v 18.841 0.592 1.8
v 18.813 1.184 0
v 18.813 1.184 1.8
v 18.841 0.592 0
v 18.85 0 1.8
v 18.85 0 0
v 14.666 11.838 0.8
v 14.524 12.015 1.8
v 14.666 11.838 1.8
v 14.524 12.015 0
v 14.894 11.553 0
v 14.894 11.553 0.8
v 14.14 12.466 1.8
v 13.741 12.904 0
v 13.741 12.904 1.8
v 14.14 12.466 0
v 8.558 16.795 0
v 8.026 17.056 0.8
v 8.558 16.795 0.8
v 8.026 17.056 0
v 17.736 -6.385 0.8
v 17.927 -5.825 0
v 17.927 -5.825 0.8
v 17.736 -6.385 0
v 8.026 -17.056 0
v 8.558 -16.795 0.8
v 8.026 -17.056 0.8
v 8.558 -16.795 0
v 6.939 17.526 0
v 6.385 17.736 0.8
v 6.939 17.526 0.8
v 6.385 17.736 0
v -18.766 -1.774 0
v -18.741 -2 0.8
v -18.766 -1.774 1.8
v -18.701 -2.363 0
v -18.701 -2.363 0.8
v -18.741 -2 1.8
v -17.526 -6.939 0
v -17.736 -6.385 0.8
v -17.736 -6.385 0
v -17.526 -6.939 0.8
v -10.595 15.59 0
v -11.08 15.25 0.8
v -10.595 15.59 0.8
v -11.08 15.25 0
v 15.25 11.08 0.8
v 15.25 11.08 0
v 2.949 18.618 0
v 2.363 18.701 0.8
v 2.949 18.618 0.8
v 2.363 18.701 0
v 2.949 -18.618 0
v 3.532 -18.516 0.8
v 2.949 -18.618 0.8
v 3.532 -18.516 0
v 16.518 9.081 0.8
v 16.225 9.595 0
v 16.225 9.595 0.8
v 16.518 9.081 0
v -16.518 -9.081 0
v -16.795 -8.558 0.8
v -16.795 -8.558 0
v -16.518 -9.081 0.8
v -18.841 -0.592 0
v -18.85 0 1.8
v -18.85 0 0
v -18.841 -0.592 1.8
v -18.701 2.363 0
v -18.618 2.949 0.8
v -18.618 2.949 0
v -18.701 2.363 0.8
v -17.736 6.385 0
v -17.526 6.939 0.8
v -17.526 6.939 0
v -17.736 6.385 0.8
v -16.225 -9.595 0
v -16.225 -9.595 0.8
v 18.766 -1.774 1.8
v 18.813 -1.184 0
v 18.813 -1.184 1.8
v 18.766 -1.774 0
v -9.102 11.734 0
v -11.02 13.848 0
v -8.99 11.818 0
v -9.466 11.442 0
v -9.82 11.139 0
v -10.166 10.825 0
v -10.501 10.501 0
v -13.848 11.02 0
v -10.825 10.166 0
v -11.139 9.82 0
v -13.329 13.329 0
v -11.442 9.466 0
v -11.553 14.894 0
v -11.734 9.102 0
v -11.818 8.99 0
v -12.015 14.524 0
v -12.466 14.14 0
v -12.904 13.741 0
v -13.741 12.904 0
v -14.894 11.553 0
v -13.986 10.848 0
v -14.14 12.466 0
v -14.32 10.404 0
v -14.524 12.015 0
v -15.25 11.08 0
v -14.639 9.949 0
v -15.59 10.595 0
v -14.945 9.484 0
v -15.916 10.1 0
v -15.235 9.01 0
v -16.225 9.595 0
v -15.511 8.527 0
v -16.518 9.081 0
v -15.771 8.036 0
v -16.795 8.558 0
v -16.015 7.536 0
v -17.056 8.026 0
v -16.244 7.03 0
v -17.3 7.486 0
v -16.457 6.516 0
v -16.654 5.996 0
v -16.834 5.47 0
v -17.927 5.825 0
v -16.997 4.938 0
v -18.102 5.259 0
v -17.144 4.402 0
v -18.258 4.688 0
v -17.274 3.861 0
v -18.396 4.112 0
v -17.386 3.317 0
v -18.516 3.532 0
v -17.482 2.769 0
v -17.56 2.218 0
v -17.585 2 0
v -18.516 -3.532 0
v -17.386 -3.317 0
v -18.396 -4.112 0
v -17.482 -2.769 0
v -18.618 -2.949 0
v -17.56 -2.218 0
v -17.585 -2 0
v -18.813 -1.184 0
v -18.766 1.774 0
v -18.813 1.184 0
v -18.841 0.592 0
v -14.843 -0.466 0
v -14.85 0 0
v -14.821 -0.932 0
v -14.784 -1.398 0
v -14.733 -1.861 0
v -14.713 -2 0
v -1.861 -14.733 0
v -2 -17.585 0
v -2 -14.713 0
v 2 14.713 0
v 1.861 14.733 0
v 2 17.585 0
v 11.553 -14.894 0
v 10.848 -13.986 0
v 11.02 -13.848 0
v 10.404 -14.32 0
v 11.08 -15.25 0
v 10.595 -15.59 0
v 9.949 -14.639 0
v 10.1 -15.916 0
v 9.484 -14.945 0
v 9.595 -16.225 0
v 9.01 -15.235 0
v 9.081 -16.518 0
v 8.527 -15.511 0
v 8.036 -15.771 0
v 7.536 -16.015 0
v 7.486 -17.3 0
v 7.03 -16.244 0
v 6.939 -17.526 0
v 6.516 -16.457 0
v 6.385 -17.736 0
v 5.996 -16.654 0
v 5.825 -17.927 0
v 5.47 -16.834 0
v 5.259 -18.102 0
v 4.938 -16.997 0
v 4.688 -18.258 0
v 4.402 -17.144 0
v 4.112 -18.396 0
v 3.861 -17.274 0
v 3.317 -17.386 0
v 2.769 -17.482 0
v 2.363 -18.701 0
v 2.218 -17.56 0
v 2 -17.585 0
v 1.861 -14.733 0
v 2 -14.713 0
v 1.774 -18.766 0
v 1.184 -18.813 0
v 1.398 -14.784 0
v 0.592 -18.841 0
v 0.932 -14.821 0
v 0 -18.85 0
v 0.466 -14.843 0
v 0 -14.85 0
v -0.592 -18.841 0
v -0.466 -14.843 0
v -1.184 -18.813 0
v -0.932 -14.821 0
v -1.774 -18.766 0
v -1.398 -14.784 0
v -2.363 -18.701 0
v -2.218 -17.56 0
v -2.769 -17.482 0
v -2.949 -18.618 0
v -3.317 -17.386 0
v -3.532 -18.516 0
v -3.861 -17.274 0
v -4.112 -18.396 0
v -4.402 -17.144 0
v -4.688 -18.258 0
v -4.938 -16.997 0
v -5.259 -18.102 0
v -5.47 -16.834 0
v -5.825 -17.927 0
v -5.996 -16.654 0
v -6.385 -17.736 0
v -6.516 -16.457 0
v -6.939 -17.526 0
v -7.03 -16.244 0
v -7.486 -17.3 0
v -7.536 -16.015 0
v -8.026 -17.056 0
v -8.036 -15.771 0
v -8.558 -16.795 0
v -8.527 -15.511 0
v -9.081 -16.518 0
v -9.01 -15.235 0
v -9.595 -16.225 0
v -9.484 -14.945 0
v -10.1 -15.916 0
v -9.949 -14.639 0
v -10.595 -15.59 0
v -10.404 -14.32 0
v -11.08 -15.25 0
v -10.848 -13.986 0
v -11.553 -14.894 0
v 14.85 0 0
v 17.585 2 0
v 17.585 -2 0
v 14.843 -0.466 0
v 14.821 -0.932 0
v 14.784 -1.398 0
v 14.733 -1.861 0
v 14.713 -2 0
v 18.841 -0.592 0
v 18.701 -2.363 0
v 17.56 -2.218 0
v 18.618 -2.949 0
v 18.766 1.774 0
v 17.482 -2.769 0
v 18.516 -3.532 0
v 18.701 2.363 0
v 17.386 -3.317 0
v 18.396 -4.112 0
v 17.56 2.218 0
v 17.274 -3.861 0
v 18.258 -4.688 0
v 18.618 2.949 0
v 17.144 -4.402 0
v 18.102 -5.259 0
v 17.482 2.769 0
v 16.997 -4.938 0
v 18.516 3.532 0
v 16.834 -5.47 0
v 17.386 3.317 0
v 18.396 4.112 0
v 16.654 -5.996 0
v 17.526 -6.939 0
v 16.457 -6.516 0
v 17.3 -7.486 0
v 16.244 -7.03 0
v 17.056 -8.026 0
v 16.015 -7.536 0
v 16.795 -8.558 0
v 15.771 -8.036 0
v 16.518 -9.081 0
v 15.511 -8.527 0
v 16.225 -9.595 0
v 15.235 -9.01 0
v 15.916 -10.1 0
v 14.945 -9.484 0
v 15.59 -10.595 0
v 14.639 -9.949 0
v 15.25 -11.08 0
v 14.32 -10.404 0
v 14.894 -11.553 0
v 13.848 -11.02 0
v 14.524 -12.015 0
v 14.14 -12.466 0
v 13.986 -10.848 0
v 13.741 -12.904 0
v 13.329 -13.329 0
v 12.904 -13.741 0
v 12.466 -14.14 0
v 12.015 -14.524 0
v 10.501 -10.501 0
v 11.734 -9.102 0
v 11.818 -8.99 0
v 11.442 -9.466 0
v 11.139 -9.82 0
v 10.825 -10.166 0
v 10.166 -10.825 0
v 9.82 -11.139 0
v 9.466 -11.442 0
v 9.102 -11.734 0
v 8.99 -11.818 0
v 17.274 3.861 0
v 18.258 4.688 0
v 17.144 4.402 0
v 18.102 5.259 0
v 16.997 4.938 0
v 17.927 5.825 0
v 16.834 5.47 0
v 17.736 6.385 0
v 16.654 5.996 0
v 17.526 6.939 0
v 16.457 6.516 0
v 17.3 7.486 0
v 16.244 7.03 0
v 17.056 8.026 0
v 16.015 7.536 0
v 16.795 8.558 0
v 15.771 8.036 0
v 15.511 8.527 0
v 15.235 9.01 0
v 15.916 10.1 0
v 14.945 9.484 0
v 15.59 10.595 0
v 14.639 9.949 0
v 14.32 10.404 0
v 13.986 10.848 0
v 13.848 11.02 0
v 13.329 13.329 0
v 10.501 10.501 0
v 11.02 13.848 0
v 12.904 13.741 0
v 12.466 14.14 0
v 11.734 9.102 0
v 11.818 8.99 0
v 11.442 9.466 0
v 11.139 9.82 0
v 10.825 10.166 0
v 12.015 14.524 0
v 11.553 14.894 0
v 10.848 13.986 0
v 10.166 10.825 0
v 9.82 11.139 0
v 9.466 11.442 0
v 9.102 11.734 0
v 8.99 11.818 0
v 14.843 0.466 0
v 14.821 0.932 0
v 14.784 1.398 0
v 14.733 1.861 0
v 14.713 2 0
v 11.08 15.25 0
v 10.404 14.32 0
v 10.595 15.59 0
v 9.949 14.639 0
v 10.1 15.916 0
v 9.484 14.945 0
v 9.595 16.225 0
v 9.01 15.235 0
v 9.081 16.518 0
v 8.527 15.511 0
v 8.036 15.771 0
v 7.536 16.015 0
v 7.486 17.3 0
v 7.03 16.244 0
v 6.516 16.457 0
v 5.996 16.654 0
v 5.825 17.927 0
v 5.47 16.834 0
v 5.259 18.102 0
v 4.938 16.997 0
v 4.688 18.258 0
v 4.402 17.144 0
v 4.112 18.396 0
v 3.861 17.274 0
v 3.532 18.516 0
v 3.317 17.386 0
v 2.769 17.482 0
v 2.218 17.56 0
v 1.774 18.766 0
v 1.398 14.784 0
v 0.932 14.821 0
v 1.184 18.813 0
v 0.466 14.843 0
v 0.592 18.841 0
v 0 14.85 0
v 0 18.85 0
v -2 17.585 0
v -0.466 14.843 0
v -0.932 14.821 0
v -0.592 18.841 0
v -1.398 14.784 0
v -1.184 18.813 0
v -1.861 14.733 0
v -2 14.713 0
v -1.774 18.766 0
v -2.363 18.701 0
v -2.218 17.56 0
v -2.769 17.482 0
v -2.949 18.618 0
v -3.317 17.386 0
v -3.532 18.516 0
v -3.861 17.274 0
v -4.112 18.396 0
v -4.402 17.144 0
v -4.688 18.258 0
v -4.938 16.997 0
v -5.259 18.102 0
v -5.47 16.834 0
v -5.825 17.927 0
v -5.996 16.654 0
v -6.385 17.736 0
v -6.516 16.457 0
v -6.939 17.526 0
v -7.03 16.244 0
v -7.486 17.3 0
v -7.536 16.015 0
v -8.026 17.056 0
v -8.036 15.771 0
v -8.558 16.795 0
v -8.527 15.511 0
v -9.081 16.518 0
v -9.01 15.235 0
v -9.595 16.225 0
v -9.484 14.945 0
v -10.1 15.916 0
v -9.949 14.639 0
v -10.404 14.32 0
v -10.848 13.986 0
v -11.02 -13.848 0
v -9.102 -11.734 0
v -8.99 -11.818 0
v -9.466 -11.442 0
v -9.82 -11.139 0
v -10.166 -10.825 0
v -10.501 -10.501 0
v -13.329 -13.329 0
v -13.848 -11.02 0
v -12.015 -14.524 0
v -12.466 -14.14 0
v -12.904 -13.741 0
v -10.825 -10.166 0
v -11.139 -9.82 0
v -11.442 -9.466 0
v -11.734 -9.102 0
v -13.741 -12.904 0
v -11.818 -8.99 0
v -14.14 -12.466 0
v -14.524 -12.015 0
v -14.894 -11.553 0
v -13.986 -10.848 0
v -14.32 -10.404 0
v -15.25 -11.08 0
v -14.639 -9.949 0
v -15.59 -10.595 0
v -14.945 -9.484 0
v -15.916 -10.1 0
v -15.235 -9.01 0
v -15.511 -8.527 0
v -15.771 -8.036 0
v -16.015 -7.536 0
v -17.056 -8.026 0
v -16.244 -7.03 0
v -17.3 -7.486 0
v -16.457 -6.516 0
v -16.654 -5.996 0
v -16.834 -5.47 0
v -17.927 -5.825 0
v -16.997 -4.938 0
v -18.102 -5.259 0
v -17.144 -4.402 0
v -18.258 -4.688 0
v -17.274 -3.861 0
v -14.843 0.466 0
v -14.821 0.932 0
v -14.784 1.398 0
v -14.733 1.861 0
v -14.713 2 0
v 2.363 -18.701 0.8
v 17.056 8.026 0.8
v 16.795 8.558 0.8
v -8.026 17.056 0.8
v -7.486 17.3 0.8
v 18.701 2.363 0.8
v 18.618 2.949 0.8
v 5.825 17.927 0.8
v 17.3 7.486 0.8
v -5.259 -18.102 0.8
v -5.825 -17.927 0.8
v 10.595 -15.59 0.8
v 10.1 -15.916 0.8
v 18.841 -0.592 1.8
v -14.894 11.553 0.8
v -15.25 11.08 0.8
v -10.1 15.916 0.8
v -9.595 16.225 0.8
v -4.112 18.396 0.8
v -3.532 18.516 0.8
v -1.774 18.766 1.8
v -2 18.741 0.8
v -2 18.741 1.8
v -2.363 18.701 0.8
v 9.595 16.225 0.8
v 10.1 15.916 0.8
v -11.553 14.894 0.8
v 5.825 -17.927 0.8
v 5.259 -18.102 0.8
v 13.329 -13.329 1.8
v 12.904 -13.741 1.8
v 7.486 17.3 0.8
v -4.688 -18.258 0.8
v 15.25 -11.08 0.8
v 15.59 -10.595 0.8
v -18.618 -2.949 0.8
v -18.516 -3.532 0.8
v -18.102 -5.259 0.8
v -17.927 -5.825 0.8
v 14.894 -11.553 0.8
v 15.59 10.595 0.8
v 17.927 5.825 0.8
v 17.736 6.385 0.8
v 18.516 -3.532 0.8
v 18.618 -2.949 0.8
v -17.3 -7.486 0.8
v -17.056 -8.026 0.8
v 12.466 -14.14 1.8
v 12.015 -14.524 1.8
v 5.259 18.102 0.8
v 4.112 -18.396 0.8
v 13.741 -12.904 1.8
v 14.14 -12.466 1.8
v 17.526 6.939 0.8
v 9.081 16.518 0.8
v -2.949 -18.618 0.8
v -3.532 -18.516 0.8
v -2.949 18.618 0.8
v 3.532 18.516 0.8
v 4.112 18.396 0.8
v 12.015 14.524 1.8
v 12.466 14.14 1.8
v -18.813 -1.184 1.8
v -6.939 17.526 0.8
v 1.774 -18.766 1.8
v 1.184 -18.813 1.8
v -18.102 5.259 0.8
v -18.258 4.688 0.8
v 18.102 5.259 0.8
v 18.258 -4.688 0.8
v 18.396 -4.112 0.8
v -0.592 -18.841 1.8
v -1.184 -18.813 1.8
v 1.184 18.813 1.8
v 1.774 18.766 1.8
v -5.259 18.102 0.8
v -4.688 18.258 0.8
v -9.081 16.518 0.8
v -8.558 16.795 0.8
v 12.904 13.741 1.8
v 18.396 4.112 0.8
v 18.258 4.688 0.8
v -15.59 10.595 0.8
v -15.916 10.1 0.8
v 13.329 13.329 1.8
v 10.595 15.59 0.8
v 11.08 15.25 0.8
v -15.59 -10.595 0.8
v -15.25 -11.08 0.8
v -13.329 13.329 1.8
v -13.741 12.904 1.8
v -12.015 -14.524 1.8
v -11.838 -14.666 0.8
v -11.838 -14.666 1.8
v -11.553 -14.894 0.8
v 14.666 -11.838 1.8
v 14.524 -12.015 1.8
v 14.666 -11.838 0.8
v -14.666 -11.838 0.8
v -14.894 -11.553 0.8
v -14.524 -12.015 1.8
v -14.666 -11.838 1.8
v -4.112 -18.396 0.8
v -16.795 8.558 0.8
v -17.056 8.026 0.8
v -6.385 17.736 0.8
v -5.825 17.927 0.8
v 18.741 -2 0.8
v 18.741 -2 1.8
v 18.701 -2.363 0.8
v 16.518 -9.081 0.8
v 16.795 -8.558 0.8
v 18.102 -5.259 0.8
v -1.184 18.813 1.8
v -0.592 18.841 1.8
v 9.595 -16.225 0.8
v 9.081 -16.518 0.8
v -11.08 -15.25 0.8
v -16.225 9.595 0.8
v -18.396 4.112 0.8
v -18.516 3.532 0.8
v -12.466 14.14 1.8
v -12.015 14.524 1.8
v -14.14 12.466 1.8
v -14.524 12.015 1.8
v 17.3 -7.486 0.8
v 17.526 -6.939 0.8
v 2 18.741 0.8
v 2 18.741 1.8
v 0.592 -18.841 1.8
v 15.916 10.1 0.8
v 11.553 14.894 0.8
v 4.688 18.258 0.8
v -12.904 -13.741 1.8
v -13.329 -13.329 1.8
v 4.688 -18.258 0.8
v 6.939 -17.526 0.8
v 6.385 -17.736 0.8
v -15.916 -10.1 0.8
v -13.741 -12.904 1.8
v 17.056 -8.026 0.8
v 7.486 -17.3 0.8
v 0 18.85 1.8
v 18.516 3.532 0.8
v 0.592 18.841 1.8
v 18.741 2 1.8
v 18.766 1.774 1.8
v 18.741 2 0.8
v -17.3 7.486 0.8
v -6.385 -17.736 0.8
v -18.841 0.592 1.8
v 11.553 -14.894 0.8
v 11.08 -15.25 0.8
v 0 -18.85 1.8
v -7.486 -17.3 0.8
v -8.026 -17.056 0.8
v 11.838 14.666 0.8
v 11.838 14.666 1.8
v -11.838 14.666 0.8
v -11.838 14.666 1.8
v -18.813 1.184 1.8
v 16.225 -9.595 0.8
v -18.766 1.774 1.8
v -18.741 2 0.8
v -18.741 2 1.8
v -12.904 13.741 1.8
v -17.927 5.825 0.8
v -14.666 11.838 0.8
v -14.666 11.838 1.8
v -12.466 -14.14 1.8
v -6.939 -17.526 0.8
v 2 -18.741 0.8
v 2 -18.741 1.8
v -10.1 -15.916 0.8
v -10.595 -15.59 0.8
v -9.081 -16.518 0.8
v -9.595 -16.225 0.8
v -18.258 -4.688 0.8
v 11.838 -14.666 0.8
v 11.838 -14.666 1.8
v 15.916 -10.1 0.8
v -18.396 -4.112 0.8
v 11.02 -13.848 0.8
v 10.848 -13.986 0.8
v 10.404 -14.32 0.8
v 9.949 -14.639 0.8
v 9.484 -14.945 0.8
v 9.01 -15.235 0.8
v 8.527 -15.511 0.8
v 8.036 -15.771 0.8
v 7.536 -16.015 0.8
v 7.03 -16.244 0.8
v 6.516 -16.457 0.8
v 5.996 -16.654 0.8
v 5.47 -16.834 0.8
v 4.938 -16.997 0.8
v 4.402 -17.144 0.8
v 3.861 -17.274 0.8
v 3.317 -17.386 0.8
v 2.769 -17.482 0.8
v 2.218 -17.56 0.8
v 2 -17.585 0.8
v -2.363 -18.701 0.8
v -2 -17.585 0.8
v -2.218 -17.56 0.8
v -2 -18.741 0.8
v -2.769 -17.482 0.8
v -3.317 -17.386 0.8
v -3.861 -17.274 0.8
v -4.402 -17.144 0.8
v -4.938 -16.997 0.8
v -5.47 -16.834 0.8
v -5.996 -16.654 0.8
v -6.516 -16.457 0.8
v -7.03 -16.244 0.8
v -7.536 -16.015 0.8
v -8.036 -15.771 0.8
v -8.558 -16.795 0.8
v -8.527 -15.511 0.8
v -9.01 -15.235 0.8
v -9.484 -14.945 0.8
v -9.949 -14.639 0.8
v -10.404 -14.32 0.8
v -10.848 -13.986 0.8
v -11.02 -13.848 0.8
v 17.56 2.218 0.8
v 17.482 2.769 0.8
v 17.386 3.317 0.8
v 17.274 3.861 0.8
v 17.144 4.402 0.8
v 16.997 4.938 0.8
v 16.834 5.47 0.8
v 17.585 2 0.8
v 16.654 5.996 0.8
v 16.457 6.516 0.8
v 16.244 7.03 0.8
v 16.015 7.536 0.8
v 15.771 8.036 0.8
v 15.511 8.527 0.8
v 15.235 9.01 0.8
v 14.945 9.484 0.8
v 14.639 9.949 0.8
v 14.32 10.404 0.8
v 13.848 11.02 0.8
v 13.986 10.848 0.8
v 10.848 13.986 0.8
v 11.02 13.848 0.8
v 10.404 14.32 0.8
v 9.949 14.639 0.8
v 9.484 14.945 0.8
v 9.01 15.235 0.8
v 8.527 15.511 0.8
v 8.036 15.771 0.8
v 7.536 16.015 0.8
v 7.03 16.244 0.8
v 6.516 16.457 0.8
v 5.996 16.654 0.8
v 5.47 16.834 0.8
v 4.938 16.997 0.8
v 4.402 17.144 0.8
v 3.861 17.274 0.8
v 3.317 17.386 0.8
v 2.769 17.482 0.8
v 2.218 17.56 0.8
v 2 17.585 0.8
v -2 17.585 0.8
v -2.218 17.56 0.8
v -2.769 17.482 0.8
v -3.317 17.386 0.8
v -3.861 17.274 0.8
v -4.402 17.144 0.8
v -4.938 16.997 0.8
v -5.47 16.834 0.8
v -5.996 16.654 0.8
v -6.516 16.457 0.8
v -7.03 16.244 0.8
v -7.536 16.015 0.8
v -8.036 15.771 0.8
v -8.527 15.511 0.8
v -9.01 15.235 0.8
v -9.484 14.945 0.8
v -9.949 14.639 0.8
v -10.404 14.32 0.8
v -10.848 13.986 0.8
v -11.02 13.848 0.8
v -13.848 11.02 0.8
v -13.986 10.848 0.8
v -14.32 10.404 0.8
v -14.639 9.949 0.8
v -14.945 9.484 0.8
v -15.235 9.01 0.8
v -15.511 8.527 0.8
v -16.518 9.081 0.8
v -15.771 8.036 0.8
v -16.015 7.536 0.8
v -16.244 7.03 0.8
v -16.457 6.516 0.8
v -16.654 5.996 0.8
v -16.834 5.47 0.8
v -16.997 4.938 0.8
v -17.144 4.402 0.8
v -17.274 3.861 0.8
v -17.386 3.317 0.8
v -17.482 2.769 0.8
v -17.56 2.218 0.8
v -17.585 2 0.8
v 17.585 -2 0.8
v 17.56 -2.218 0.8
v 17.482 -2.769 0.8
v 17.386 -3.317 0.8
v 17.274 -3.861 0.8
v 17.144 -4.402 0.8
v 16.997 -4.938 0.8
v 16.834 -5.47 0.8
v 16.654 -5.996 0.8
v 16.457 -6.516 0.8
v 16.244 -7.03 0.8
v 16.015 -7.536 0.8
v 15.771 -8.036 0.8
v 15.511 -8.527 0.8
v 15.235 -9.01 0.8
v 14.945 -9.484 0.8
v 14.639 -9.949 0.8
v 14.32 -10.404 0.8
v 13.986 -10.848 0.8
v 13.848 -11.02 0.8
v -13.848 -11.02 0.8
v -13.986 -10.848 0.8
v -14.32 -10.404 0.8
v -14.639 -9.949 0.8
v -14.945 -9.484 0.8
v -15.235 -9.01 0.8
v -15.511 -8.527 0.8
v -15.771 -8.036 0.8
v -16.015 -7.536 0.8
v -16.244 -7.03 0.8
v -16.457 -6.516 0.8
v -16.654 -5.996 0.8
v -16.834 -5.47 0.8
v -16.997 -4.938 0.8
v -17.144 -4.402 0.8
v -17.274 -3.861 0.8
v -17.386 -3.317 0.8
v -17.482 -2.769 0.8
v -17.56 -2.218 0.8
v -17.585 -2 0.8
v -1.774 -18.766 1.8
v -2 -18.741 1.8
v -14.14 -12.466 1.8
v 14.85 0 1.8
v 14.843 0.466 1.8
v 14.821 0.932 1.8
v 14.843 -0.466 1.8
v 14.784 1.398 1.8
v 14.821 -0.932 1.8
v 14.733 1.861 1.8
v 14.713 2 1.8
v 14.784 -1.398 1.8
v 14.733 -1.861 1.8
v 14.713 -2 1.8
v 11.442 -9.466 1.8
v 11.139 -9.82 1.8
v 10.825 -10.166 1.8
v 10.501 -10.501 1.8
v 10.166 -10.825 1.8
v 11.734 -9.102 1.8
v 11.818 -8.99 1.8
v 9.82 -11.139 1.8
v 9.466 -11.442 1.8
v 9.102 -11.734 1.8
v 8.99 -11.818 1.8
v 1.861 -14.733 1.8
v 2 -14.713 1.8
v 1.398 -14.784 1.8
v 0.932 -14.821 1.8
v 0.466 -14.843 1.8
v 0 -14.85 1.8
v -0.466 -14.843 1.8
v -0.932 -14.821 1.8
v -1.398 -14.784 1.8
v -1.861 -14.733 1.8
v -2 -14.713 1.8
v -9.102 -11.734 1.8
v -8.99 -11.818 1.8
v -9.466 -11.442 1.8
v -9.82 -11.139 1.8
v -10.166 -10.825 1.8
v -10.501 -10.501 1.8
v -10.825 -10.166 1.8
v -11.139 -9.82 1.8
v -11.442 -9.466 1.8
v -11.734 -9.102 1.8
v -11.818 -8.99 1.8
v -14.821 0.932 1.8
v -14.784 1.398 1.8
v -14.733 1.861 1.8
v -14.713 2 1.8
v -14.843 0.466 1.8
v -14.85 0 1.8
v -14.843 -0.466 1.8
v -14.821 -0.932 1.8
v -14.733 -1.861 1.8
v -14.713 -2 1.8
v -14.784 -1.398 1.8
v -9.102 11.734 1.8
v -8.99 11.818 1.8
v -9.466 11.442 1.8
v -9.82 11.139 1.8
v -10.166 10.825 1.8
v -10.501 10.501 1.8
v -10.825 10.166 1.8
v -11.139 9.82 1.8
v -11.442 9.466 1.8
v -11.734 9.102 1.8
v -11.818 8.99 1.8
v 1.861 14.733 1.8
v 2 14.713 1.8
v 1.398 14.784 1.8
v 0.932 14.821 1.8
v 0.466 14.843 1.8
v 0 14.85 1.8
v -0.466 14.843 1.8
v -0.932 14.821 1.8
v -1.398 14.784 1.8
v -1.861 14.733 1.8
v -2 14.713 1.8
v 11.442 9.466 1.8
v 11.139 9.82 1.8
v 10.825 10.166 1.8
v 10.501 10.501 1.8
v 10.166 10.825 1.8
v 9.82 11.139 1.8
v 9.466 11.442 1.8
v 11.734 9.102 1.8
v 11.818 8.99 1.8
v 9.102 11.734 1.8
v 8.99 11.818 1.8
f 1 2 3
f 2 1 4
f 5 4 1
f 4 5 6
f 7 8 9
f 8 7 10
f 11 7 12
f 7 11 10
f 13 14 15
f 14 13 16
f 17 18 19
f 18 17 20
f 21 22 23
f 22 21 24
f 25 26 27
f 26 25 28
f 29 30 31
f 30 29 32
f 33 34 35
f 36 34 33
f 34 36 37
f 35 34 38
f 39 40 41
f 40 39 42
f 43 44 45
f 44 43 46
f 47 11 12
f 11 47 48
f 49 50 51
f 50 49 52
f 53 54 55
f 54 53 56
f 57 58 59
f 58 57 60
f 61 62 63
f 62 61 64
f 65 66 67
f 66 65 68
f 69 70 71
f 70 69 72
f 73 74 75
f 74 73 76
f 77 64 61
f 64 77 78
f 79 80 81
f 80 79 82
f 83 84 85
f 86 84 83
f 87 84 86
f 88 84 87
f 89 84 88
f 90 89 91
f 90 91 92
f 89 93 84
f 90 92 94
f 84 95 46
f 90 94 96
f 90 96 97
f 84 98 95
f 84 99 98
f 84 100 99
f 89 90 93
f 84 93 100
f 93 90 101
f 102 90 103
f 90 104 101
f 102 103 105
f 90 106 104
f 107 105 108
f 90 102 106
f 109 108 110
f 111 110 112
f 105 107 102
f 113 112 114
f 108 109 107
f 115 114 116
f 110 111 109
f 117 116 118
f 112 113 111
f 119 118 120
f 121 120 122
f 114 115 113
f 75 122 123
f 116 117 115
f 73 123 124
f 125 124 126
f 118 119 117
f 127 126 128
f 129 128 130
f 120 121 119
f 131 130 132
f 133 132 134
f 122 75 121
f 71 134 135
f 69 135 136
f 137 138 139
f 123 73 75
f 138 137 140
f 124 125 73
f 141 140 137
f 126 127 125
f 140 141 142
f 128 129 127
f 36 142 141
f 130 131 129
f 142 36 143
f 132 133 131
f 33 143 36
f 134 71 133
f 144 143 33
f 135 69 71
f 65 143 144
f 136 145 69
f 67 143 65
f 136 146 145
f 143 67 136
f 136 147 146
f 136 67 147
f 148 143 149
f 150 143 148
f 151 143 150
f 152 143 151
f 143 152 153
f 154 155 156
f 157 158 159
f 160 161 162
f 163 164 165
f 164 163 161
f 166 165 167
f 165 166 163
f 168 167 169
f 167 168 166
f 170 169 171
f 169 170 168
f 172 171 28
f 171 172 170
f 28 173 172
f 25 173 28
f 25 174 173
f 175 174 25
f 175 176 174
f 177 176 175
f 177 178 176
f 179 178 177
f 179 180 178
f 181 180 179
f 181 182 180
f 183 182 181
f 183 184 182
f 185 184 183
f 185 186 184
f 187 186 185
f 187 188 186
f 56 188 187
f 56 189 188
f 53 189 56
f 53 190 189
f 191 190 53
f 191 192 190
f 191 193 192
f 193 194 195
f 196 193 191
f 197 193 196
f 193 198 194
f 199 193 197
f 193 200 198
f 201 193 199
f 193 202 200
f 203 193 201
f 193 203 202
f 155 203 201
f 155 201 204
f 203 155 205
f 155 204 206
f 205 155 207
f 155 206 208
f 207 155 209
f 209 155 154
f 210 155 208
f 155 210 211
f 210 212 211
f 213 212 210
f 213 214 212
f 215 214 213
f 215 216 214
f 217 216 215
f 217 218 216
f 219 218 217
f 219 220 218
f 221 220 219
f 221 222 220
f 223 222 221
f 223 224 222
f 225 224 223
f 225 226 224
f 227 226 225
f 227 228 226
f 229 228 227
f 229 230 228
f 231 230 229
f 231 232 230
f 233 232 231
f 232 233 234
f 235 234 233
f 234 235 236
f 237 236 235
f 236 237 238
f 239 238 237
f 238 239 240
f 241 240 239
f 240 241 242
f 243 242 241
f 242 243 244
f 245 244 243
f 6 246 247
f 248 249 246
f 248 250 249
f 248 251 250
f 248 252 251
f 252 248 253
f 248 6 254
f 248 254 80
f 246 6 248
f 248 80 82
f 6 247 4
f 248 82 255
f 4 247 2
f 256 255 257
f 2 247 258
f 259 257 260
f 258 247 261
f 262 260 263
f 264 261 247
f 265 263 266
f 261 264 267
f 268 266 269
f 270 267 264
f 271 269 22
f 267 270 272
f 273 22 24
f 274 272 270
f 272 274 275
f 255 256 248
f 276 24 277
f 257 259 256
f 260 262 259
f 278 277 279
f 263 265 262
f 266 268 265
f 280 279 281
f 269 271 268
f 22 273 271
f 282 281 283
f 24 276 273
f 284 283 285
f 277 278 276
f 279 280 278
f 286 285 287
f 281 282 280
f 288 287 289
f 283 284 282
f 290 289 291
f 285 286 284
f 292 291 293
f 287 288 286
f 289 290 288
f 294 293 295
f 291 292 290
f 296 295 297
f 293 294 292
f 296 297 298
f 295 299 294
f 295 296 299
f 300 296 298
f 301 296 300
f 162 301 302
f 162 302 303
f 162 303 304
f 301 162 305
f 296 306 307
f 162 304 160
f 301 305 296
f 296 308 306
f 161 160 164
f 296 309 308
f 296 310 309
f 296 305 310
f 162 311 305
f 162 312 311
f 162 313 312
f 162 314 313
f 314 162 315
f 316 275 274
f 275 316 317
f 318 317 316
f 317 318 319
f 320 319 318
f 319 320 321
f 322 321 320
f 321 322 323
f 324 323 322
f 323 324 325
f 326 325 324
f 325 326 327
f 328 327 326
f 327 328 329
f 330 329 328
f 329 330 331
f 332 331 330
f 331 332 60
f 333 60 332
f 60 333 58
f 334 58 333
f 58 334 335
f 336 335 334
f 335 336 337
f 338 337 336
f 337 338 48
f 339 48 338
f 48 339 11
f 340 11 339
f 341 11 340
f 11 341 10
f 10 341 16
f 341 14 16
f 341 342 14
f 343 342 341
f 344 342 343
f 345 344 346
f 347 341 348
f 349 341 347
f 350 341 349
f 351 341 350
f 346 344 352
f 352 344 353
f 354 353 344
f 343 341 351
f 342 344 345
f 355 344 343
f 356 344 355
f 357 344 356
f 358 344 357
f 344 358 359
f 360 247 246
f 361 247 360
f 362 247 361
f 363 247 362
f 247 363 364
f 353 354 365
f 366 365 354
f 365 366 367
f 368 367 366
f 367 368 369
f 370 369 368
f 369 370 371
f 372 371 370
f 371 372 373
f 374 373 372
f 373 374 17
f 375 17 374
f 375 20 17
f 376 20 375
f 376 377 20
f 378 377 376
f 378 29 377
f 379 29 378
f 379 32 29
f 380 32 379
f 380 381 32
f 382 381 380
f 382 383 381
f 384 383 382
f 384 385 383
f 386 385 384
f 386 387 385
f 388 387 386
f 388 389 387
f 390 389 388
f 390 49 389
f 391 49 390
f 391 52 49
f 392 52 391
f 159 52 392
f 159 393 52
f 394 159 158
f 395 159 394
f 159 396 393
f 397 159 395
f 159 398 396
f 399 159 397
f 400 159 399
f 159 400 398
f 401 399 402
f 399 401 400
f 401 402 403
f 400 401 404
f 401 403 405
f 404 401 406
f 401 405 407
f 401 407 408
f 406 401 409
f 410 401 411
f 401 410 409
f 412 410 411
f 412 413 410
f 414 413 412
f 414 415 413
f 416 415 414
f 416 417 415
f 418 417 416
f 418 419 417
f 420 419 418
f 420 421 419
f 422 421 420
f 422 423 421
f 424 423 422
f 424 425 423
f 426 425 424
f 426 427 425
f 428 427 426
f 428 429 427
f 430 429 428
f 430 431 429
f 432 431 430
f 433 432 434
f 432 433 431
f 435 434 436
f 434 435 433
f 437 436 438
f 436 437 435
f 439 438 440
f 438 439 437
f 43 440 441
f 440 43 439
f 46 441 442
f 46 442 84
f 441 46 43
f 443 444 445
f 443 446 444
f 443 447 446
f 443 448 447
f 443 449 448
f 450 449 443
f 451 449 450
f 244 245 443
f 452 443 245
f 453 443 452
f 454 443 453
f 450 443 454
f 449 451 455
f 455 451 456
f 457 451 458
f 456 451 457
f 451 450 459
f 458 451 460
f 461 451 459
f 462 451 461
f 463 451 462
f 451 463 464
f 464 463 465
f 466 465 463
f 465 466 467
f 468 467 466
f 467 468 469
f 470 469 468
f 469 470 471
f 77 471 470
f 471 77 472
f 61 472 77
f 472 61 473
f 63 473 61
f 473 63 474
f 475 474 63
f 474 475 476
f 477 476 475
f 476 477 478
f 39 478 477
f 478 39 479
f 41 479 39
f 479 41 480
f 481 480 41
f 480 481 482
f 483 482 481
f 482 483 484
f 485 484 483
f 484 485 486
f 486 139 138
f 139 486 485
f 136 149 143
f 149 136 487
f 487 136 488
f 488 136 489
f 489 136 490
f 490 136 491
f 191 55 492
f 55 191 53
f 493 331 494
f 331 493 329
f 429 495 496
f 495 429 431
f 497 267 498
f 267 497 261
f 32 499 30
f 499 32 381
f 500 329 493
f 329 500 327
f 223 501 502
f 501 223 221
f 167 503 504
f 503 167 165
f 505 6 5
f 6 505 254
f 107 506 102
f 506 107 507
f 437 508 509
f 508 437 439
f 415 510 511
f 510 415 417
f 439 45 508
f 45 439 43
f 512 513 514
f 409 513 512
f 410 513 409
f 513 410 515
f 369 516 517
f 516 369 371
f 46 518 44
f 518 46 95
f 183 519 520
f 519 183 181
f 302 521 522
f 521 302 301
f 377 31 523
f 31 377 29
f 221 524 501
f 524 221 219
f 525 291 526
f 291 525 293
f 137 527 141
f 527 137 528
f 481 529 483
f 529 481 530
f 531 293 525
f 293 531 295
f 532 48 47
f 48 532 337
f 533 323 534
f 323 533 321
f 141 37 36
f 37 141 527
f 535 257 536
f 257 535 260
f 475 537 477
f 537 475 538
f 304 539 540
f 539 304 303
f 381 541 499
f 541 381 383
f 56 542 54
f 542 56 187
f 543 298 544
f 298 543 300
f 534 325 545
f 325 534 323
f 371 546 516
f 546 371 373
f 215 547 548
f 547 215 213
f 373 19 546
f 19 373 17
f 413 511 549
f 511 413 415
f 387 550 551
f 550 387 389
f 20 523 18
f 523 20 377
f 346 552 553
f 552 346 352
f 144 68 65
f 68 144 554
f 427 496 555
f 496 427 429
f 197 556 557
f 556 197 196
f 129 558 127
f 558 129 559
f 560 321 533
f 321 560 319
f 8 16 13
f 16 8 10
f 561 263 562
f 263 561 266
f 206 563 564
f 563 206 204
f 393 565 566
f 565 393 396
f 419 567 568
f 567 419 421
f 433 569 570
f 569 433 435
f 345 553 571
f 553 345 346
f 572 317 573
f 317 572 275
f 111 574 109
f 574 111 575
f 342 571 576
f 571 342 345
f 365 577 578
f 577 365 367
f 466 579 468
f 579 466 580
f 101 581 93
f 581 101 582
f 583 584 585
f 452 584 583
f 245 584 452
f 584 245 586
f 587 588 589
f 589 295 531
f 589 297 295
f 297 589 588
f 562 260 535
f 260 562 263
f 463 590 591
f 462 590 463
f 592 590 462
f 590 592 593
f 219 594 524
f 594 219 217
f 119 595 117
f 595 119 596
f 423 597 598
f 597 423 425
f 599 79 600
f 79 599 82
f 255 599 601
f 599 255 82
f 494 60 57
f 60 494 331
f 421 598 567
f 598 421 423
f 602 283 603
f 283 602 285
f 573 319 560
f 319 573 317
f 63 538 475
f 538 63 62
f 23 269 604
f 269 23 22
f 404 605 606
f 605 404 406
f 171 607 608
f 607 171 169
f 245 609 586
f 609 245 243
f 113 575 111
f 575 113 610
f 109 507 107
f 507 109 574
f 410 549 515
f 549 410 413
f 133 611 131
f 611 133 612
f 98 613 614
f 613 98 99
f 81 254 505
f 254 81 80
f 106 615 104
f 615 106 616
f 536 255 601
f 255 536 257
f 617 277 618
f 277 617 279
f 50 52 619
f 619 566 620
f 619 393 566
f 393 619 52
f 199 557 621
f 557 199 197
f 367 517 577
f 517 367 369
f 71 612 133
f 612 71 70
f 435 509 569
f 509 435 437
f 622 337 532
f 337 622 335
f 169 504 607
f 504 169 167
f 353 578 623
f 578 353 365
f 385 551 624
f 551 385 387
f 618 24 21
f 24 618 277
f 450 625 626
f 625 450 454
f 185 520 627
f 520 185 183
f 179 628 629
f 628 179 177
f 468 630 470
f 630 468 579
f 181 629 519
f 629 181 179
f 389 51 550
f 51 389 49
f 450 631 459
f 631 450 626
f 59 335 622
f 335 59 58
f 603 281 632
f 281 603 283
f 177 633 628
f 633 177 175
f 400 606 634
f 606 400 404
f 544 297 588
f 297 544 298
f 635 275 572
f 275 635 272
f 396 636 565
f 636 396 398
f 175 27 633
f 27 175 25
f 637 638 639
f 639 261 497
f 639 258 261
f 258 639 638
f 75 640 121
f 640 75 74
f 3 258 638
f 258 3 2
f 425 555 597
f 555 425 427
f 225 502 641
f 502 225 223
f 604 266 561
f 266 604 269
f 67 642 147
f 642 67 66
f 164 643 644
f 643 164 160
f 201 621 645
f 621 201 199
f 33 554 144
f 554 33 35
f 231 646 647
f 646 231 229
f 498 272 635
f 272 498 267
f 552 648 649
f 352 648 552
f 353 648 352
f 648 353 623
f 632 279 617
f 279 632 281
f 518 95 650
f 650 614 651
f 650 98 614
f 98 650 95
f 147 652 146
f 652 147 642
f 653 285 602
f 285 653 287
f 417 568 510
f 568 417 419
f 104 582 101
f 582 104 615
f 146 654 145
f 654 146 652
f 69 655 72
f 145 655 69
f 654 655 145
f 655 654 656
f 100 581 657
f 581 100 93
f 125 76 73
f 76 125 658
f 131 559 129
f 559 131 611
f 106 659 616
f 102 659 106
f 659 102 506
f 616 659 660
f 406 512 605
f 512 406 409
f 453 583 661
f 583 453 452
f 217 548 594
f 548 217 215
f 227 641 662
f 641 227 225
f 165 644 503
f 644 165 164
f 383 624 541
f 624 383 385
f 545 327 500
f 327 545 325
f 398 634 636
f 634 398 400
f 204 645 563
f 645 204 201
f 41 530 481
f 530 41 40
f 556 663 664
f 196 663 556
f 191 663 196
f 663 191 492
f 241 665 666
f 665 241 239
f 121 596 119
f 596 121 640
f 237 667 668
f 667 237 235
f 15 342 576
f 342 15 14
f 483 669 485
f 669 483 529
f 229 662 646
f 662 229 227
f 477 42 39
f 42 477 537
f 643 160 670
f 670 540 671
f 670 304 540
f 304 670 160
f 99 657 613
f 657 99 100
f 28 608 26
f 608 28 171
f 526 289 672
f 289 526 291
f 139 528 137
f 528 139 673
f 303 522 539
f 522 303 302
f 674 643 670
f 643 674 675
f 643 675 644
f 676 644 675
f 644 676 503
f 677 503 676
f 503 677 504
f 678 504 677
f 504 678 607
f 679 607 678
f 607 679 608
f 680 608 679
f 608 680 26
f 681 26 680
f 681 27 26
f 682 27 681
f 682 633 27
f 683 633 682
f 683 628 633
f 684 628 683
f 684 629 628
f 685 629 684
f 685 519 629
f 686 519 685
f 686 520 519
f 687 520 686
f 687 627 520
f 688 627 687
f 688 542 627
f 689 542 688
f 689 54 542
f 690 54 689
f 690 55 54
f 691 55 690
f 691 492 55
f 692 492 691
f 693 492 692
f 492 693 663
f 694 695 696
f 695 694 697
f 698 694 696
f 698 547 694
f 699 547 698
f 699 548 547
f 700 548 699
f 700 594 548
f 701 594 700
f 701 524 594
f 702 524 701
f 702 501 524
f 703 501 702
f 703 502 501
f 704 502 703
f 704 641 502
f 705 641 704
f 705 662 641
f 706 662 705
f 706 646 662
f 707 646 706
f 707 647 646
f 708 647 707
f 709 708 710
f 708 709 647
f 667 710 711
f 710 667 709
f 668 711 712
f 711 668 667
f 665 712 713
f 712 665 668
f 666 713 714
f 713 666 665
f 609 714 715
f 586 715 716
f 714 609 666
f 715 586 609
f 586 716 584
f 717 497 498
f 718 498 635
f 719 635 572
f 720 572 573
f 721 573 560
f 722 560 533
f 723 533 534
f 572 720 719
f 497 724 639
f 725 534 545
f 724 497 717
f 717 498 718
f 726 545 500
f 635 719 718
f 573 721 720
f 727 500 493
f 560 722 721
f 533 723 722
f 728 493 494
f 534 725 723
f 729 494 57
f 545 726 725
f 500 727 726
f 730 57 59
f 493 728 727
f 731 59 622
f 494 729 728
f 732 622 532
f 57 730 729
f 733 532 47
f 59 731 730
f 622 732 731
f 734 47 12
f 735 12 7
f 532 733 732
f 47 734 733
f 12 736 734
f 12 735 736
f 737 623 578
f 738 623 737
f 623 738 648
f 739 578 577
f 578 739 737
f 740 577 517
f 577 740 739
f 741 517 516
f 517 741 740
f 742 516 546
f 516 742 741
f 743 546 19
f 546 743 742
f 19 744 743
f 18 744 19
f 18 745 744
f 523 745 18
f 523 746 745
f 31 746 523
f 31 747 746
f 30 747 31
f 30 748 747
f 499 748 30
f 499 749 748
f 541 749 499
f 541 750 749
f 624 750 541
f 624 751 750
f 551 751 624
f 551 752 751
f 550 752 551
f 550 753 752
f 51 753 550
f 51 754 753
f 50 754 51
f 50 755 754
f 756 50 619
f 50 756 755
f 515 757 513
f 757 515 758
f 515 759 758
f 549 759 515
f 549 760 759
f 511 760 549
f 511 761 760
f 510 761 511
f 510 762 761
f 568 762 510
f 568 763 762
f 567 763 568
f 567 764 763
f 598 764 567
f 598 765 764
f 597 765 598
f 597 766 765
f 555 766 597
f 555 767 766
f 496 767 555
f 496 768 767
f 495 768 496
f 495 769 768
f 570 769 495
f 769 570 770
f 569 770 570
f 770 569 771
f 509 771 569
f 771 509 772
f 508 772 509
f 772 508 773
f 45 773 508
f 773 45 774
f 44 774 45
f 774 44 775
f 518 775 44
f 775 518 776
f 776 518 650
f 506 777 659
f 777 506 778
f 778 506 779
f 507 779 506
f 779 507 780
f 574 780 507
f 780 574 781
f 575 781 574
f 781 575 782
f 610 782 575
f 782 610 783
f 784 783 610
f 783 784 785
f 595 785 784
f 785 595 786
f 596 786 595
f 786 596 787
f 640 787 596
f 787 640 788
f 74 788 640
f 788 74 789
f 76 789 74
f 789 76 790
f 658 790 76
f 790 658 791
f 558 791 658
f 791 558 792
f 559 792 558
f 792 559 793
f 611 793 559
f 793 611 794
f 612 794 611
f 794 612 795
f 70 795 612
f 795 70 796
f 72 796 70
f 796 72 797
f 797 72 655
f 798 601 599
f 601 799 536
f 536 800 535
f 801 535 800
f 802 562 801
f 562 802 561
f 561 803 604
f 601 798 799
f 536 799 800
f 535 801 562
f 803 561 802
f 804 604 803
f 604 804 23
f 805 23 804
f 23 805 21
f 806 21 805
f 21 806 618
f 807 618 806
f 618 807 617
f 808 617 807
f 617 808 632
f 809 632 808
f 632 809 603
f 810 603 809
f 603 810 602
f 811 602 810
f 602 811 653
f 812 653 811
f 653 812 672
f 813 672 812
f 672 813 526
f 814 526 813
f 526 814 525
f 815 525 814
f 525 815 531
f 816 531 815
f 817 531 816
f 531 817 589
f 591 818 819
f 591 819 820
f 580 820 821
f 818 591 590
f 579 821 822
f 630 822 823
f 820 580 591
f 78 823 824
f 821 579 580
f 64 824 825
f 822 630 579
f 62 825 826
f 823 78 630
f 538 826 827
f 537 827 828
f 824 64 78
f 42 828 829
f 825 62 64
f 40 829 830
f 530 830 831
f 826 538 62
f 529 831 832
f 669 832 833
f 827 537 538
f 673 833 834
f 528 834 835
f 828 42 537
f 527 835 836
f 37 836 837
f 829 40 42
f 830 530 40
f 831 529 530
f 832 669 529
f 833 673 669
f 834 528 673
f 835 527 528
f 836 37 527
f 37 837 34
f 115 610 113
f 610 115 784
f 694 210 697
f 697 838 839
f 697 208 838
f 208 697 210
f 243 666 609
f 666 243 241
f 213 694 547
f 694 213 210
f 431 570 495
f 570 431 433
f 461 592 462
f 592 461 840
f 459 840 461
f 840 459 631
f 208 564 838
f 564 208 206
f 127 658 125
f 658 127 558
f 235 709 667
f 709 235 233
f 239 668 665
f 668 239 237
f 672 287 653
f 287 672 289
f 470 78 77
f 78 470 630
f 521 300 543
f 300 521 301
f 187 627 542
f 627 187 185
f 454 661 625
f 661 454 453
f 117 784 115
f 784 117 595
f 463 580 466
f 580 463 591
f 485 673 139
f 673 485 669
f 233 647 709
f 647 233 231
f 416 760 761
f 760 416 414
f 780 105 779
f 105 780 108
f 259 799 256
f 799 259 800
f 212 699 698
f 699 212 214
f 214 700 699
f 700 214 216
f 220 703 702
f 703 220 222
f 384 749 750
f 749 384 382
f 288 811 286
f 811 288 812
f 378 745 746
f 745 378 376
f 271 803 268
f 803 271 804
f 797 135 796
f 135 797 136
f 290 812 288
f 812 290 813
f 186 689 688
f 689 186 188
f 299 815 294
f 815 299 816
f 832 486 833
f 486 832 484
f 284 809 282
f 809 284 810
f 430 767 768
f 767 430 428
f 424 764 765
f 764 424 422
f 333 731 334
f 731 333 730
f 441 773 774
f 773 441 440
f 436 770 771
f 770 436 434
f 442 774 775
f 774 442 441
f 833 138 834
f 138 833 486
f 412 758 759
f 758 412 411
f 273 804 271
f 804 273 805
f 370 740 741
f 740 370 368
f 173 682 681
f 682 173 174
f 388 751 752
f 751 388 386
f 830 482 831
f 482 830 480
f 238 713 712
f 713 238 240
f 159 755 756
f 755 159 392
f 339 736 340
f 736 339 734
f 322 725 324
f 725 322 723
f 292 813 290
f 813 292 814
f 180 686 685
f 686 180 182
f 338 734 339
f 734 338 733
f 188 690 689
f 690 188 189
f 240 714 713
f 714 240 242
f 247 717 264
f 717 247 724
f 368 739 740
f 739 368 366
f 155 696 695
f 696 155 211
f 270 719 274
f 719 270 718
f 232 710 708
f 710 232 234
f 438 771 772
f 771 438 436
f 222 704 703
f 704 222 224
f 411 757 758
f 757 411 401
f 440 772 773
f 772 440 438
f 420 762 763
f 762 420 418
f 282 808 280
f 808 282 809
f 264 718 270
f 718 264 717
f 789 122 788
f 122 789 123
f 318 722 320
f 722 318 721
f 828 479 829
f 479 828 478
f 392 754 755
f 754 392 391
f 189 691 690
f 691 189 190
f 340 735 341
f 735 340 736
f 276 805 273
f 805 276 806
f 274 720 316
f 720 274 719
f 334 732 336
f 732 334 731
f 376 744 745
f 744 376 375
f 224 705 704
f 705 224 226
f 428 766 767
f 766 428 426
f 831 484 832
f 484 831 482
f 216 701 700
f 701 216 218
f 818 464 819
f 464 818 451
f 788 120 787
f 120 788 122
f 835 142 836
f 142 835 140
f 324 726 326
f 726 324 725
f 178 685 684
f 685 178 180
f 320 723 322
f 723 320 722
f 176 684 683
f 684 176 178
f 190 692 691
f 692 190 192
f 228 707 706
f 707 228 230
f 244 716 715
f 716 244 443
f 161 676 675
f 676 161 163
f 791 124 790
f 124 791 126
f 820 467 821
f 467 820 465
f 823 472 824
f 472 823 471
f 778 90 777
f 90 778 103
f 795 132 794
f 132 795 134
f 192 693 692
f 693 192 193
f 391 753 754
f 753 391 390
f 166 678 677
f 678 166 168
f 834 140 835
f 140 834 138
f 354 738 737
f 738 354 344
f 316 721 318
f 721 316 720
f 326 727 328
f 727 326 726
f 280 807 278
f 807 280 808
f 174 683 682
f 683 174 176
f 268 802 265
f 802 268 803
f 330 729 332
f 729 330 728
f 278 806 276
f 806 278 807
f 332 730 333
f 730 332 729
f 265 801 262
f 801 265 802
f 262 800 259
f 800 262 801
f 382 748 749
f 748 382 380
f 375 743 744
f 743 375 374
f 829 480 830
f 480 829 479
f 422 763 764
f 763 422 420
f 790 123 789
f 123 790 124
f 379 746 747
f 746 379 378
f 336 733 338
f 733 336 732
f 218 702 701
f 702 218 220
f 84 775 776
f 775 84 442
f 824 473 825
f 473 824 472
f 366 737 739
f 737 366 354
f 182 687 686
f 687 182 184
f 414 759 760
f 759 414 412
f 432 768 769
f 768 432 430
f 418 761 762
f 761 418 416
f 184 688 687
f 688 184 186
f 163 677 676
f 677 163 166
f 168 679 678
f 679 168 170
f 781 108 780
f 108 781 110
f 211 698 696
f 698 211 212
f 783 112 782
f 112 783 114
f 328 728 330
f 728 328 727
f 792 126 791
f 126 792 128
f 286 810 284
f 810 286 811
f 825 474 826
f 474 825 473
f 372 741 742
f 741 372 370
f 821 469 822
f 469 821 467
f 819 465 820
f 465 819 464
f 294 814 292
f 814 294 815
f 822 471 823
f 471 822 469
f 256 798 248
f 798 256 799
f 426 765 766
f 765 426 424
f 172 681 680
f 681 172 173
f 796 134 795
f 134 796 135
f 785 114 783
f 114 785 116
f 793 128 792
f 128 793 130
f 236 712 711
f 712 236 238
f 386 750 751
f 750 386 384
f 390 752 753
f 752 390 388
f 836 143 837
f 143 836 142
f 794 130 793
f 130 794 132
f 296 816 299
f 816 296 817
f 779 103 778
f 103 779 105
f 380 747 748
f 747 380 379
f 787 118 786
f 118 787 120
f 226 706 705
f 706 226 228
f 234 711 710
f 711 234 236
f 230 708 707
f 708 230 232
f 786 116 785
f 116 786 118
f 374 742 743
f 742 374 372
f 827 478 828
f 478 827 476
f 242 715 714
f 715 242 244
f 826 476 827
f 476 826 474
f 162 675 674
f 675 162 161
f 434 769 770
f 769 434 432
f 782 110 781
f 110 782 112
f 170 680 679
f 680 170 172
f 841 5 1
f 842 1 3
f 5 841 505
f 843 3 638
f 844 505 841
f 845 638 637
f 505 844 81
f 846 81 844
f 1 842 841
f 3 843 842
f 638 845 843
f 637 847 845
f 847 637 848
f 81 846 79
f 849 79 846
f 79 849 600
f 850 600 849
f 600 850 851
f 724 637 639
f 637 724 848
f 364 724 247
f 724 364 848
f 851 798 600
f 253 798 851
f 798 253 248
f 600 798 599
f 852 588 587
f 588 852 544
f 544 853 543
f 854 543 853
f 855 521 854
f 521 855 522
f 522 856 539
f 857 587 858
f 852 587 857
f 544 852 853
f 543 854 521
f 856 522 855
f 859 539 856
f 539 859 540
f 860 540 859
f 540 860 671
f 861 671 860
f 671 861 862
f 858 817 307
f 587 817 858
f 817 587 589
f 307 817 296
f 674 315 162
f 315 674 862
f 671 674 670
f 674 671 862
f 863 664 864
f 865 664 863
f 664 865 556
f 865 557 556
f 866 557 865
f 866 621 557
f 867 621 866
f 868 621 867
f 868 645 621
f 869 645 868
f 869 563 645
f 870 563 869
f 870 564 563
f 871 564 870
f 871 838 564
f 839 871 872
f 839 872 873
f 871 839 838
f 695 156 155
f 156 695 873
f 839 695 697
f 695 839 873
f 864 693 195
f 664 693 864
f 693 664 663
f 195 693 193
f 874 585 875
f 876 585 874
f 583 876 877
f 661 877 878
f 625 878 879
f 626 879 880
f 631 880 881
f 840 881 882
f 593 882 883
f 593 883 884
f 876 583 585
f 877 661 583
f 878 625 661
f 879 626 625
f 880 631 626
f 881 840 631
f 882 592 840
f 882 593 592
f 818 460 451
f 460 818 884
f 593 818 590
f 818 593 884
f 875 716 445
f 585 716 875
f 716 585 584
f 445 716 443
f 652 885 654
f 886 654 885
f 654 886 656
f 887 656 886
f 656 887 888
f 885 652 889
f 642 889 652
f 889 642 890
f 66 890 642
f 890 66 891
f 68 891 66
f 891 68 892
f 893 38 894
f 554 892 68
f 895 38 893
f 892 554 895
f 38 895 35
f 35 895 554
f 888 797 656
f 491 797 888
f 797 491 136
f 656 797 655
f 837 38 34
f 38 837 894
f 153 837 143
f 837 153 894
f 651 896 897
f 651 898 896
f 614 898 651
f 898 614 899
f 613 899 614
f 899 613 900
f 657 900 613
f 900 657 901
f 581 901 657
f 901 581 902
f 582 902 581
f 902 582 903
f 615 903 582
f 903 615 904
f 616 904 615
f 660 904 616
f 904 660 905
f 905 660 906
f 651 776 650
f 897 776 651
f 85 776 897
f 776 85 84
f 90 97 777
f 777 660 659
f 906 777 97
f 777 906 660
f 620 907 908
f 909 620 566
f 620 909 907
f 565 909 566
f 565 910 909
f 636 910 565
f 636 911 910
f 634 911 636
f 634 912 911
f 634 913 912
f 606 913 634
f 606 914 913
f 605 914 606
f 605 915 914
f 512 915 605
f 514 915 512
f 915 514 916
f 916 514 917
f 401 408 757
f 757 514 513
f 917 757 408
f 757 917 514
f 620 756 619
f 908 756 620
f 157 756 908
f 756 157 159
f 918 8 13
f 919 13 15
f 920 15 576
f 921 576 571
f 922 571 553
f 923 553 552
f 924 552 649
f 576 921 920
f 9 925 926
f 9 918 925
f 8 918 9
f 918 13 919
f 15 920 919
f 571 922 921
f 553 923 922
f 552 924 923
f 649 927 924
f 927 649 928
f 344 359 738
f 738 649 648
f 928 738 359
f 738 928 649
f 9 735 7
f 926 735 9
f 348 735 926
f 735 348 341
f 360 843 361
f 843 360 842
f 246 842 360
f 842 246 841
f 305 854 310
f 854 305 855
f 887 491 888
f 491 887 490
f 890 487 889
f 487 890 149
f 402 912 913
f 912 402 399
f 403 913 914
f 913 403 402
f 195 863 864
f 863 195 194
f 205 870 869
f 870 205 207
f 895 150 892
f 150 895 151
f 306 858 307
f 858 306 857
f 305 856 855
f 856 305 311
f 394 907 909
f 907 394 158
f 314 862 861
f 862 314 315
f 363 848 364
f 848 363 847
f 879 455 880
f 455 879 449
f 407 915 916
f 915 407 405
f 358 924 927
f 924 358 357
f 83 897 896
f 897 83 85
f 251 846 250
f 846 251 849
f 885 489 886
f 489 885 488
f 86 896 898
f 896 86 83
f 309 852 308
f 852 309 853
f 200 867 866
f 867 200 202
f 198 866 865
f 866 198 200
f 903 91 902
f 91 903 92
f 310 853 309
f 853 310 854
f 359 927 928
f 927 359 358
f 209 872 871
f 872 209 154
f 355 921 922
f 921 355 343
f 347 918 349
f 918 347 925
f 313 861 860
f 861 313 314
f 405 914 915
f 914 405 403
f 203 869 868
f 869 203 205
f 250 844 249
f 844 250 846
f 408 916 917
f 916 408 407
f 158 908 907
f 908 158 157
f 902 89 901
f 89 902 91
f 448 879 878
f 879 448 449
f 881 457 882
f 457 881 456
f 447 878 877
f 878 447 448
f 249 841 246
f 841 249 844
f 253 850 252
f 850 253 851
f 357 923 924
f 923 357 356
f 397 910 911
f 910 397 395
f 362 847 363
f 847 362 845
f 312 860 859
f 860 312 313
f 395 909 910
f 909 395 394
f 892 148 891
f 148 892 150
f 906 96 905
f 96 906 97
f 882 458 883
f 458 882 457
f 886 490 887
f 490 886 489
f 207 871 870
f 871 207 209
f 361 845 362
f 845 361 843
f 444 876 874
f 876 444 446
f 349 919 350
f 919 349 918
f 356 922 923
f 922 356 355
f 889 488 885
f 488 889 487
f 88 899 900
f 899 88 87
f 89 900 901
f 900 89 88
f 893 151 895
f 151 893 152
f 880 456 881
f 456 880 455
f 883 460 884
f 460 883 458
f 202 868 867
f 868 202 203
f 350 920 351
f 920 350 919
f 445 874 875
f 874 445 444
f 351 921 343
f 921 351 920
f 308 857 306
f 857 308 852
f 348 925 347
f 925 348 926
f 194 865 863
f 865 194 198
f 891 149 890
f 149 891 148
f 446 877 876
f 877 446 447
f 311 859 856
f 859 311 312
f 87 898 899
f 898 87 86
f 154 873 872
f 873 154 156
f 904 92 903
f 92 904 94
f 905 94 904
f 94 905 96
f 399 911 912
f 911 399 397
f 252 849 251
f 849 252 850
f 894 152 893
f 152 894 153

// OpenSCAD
$fn=200;

module hub_teeth()
{
	intersection()
	{
		union()
		{
			rotate([0,0,-360/8*0]) translate([16,0,0.9]) cube([7,4,1.8], center=true);
			rotate([0,0,-360/8*1]) translate([16,0,0.9]) cube([7,4,1.8], center=true);
			rotate([0,0,-360/8*2]) translate([16,0,0.9]) cube([7,4,1.8], center=true);
			rotate([0,0,-360/8*3]) translate([16,0,0.9]) cube([7,4,1.8], center=true);
			rotate([0,0,-360/8*4]) translate([16,0,0.9]) cube([7,4,1.8], center=true);
			rotate([0,0,-360/8*5]) translate([16,0,0.9]) cube([7,4,1.8], center=true);
			rotate([0,0,-360/8*6]) translate([16,0,0.9]) cube([7,4,1.8], center=true);
			rotate([0,0,-360/8*7]) translate([16,0,0.9]) cube([7,4,1.8], center=true);
		}
		difference()
		{
			cylinder(h=2,d=37.7);
			translate([0,0,-0.1]) cylinder(h=3,d=29.7);
		}
	}
	
}


difference()
{
	cylinder(h=0.8,d=37.7);
	translate([0,0,-0.1]) cylinder(h=2,d=35.4);
}
hub_teeth();	
	
